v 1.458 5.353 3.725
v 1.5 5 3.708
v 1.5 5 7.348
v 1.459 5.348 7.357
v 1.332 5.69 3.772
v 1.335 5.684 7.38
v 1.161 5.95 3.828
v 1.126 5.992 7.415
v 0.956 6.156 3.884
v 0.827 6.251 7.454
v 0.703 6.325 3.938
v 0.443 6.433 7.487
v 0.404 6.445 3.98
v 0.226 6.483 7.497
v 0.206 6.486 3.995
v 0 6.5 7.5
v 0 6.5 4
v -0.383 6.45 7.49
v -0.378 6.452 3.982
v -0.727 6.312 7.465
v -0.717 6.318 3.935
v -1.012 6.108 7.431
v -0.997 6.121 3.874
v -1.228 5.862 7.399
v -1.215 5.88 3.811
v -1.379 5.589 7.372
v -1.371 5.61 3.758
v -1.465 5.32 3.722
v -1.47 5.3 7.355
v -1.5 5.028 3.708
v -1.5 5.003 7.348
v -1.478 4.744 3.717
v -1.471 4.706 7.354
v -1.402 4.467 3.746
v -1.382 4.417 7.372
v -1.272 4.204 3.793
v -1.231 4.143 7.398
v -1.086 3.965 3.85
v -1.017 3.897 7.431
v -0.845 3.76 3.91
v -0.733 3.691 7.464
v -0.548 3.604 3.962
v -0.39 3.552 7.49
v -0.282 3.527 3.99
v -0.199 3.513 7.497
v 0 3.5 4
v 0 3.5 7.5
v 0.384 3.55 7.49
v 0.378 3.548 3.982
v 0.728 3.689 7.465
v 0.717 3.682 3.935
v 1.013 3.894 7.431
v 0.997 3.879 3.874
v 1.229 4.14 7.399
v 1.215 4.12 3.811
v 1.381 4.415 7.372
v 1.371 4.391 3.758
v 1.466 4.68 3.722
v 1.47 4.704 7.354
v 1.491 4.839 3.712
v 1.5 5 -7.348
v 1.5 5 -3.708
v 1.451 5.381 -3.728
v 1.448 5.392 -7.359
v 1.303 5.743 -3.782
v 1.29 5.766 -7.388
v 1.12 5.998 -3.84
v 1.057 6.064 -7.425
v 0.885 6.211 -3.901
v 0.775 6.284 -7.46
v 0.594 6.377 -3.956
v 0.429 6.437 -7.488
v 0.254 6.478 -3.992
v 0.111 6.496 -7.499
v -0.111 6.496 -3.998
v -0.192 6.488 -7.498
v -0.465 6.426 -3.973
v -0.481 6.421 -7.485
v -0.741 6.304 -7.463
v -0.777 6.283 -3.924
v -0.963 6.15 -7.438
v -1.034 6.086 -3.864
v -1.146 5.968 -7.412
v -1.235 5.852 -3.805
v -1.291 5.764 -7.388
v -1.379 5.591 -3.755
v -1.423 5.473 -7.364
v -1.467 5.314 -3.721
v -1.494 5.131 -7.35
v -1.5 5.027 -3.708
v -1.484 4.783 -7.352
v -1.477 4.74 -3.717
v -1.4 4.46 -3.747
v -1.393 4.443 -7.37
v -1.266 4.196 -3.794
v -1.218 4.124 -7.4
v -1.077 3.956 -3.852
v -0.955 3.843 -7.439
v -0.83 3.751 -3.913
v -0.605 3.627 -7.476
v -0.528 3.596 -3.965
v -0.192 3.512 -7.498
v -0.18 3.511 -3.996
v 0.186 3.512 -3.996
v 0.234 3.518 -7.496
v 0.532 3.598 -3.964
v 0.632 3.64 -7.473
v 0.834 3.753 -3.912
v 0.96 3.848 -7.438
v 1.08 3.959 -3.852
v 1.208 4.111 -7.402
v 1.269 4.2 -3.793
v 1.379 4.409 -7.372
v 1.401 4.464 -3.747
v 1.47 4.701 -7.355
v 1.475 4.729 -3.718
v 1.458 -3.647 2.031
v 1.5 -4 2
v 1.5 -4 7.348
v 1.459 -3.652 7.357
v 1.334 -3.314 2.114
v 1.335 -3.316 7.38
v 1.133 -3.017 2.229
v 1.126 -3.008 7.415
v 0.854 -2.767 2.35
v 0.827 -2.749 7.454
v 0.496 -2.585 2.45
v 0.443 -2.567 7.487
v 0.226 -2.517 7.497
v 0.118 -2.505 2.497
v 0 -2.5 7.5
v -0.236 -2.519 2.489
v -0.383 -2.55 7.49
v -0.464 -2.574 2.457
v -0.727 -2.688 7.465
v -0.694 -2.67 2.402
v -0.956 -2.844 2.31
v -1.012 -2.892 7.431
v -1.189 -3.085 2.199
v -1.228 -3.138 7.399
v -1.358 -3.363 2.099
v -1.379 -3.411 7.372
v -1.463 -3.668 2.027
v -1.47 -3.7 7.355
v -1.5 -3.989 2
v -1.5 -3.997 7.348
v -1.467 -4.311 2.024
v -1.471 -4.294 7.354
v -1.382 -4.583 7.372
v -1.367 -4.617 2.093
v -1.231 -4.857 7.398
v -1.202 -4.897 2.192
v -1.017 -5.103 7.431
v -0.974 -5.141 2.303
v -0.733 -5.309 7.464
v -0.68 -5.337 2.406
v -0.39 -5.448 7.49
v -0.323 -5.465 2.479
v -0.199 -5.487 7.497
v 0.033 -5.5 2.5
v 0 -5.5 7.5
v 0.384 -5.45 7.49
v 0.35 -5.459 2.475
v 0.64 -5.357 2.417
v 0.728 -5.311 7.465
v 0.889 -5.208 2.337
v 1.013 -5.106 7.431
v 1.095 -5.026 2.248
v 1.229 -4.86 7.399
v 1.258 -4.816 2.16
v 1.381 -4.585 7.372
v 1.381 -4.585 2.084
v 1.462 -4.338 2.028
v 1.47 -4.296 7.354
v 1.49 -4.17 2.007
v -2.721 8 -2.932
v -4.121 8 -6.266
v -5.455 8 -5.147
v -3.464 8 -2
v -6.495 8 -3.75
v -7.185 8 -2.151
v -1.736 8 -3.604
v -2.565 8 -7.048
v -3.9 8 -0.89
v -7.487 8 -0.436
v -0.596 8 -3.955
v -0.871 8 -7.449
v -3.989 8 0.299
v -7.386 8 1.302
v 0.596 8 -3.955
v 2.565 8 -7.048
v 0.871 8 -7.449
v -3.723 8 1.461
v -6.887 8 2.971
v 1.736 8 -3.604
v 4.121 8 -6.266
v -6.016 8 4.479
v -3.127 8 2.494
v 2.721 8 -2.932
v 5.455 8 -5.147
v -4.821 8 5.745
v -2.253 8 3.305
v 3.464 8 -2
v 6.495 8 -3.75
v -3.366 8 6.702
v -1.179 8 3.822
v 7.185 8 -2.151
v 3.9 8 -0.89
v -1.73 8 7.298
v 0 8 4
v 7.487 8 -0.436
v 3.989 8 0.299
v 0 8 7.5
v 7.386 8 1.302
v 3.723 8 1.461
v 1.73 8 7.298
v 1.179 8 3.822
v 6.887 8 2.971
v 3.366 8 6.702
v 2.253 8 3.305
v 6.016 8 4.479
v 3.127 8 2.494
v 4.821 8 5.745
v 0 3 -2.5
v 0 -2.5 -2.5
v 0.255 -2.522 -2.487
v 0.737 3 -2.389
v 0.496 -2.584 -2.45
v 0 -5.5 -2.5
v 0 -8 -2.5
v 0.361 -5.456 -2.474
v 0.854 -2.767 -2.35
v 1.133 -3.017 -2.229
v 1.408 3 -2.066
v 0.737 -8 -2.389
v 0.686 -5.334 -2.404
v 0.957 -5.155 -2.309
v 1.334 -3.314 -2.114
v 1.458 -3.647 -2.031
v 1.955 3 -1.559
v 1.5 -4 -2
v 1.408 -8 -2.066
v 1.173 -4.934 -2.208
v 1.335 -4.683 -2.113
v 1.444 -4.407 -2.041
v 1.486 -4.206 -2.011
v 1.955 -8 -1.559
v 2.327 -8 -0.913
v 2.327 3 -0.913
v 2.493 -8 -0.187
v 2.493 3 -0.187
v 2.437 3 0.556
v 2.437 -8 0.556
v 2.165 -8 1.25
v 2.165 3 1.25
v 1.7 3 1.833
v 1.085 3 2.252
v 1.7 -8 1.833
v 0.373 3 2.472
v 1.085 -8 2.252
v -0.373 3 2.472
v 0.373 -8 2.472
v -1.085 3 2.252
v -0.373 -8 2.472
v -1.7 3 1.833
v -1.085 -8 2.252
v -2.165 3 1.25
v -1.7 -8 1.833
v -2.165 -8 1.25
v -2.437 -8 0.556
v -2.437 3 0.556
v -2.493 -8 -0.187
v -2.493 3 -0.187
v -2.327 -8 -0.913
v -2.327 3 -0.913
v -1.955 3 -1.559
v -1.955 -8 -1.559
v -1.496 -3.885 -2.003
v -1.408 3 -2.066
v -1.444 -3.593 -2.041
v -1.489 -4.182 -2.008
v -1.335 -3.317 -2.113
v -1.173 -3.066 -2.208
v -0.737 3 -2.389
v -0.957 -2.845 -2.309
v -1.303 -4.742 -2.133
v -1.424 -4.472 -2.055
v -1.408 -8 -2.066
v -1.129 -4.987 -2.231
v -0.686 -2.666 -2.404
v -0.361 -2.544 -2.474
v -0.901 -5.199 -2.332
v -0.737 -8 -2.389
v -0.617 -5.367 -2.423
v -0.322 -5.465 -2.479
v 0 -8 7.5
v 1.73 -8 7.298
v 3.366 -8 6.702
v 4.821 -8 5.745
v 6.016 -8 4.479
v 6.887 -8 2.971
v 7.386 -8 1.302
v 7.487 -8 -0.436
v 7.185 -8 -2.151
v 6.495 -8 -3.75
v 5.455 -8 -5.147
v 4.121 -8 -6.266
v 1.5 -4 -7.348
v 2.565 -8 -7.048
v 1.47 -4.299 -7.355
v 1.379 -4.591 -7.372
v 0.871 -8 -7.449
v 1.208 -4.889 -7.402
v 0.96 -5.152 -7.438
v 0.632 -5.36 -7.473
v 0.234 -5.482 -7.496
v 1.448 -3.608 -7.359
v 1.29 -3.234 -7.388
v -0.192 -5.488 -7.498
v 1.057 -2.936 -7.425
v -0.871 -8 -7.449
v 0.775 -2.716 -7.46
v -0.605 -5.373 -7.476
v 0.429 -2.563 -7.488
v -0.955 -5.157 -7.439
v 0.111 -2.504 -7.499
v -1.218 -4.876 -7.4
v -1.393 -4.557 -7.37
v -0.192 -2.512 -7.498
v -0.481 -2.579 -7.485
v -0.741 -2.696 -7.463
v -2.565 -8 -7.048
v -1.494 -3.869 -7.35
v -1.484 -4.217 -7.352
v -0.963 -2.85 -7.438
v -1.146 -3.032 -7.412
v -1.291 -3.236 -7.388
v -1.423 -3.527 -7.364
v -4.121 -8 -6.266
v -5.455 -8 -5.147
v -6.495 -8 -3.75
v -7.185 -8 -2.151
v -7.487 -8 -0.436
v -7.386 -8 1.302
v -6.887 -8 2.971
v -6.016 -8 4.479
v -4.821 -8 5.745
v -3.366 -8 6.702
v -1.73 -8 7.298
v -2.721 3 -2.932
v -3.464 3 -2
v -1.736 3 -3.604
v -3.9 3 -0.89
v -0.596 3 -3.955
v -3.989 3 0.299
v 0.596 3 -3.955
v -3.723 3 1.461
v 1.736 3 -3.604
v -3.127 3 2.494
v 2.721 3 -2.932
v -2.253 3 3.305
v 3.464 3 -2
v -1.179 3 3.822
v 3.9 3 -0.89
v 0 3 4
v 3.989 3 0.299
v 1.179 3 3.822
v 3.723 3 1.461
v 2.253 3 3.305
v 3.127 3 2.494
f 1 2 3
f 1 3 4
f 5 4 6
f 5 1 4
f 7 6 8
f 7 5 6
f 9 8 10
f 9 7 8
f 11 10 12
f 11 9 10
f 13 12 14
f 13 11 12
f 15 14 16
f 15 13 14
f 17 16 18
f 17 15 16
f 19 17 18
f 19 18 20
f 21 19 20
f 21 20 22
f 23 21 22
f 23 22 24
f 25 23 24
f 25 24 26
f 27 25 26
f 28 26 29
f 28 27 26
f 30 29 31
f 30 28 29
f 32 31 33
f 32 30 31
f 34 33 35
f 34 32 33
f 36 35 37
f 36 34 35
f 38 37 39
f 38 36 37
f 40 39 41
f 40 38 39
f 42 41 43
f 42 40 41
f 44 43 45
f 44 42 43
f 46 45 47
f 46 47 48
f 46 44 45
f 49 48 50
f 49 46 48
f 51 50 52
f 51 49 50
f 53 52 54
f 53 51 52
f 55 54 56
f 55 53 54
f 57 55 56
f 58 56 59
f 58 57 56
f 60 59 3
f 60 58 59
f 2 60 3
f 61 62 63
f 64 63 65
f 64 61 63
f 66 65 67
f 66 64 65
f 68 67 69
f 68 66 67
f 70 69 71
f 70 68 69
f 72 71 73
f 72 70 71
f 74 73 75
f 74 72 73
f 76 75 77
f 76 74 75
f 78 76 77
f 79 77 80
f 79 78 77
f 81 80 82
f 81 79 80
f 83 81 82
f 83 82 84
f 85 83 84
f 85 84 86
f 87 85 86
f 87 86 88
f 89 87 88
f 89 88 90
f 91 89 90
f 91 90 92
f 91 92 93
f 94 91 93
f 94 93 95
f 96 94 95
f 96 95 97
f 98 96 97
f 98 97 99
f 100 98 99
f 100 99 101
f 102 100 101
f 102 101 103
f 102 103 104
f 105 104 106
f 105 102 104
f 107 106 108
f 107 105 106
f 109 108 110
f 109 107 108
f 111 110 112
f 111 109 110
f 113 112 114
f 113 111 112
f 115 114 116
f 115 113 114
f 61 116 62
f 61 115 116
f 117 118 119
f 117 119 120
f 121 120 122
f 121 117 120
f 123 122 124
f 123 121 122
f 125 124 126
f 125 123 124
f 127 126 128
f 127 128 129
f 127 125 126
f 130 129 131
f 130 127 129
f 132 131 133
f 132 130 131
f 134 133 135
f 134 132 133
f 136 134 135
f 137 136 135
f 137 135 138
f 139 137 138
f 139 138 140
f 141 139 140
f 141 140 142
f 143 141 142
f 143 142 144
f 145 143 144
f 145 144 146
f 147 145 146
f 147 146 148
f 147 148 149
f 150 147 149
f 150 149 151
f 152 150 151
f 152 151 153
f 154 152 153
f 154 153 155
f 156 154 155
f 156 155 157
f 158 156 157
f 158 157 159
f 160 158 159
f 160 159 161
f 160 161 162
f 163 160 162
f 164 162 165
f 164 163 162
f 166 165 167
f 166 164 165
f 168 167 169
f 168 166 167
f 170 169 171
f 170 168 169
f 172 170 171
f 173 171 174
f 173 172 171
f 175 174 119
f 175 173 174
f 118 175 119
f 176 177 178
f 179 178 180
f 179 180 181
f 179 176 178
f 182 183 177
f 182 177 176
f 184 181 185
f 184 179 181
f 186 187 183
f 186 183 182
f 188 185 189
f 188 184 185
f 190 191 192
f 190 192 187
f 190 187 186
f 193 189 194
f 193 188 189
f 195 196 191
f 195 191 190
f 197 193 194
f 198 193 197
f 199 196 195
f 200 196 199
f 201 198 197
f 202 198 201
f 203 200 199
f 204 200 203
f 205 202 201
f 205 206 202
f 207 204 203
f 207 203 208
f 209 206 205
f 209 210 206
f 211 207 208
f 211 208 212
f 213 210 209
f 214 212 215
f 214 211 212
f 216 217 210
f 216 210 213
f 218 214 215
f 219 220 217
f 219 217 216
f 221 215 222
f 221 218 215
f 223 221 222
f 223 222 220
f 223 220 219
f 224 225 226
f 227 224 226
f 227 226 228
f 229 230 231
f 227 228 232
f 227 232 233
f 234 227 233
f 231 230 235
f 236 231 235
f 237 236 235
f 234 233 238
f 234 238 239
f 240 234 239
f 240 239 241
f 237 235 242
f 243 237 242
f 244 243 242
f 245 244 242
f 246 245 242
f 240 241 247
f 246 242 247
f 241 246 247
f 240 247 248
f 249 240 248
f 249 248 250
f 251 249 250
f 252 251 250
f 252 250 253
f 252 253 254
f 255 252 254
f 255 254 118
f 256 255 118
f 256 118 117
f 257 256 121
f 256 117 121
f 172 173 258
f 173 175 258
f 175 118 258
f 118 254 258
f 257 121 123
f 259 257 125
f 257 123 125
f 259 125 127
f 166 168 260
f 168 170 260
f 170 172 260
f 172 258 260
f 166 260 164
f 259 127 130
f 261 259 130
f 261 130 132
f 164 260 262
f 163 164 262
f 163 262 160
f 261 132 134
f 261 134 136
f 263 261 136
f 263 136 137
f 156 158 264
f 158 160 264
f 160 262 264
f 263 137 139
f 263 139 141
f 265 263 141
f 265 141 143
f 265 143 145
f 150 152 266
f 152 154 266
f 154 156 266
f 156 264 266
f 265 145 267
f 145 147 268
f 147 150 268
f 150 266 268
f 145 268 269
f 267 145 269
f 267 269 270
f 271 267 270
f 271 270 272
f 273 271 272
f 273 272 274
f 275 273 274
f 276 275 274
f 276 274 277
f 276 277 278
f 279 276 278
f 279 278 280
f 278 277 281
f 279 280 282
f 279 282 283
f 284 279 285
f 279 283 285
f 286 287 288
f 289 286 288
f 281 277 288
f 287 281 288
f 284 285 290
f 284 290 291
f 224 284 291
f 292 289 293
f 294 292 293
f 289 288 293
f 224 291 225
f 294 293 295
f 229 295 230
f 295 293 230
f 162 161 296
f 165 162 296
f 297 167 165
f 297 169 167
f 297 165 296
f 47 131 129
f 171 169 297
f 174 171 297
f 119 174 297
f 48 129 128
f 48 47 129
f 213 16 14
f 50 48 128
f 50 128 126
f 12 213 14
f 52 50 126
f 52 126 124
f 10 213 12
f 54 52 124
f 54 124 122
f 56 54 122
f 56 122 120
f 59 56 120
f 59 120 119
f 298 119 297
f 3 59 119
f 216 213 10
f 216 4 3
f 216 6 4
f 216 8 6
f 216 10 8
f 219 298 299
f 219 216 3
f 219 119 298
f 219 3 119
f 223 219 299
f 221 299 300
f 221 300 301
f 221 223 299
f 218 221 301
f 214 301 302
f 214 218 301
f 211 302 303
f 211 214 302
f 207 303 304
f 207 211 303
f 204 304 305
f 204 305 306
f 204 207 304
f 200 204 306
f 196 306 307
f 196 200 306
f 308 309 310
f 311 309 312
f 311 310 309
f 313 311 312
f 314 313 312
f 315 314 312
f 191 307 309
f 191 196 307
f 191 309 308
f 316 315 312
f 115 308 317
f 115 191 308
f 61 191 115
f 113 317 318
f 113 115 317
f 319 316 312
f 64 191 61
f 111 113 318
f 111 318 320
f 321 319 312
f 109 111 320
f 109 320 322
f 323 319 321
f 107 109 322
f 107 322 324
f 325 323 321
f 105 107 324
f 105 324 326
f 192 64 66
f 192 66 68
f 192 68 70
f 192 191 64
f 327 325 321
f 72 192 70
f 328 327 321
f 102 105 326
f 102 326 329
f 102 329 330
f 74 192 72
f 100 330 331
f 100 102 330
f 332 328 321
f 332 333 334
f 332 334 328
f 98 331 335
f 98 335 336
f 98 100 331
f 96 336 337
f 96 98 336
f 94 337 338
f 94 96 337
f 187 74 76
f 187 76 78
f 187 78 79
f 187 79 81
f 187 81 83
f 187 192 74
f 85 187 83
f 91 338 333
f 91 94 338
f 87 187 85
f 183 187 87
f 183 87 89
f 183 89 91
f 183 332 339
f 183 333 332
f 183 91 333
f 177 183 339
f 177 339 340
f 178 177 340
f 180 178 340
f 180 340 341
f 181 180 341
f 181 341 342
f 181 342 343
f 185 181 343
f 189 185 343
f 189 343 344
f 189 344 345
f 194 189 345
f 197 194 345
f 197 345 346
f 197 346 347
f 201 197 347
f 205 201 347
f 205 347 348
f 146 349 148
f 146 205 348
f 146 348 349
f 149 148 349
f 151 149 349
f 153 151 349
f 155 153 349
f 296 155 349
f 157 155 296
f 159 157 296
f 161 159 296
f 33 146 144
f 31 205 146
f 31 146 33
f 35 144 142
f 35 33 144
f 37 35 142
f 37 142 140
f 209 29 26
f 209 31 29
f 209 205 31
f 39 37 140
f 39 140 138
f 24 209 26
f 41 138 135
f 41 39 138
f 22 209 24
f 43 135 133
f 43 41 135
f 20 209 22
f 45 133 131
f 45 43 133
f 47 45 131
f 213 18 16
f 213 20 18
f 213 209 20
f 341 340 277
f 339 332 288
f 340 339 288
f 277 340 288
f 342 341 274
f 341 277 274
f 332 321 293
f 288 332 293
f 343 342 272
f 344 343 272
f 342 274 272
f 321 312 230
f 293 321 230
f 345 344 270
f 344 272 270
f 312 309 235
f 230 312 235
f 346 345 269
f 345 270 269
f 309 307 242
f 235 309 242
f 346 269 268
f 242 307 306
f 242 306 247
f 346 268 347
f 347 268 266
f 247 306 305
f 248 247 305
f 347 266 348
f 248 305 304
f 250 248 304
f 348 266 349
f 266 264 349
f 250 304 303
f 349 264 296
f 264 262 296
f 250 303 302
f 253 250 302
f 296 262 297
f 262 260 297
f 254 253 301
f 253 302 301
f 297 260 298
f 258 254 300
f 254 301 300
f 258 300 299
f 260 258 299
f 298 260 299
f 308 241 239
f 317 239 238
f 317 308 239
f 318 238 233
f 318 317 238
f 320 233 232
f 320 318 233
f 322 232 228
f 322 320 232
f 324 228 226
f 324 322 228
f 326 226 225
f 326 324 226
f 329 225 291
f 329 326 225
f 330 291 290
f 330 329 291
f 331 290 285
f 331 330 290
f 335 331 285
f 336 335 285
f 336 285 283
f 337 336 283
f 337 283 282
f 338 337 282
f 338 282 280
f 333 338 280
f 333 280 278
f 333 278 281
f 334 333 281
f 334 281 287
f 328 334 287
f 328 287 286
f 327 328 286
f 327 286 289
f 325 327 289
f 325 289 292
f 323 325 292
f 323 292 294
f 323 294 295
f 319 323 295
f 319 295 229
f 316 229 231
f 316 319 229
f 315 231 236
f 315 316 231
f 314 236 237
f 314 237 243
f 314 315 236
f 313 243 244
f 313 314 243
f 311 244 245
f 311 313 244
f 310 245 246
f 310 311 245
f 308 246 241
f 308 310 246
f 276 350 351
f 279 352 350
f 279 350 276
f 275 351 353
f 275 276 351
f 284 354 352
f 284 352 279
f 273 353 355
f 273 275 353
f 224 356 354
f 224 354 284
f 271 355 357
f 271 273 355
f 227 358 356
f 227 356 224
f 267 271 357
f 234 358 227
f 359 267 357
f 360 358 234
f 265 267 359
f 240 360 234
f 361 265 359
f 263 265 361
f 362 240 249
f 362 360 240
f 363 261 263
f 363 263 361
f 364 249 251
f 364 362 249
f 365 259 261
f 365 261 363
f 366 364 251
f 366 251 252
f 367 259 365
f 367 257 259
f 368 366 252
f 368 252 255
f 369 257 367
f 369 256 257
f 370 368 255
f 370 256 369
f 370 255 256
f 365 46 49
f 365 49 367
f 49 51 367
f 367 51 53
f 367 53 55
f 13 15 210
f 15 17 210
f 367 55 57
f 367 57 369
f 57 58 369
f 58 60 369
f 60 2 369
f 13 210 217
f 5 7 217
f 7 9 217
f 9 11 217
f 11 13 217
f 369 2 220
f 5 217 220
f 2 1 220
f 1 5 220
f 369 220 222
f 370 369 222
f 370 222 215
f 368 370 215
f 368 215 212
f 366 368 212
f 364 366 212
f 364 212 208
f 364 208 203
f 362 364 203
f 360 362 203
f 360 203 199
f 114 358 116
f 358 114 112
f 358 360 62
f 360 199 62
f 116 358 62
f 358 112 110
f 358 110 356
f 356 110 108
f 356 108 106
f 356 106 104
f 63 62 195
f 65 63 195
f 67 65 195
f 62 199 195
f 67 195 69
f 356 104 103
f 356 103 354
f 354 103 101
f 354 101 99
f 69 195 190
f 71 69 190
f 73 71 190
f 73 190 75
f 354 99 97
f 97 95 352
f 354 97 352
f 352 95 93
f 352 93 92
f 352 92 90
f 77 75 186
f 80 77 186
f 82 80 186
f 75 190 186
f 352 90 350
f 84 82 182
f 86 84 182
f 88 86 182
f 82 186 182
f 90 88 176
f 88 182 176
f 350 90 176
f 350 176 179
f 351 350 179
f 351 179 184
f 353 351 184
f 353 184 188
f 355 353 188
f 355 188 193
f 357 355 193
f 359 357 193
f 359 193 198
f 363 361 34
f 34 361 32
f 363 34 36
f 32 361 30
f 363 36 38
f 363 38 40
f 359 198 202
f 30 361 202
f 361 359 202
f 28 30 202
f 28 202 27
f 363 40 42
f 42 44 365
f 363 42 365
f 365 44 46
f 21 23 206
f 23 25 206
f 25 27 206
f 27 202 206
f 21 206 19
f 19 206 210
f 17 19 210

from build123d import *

# Parameters (mm, degrees)
SKETCH1_R               = 7.5
BOSS_EXTRUDE1_DEPTH     = 8
SKETCH2_R               = 4
CUT_EXTRUDE1_DEPTH      = 5
SKETCH3_R               = 2.5
CUT_EXTRUDE2_DEPTH      = 12
CUT_EXTRUDE3_DEPTH      = 14.285330256
CUT_EXTRUDE3_DEPTH_BACK = 14.285330256
SKETCH4_R               = 1.5


with BuildPart() as part:
    # Sketch1 → Boss-Extrude1 (new, symmetric)
    with BuildSketch(Plane(origin=(0, 0, 0), x_dir=(1, 0, 0), z_dir=(0, 1, 0))):
        with Locations(Location((0, 0, 0), (0, 0, 270))):
            Circle(SKETCH1_R)
    extrude(amount=BOSS_EXTRUDE1_DEPTH, both=True)

    # Sketch2 → Cut-Extrude1 (cut)
    with BuildSketch(Plane(origin=(0, 8, 0), x_dir=(1, 0, 0), z_dir=(0, 1, 0))):
        with Locations(Location((0, 0, 0), (0, 0, 270))):
            Circle(SKETCH2_R)
    extrude(amount=-CUT_EXTRUDE1_DEPTH, mode=Mode.SUBTRACT)

    # Sketch3 → Cut-Extrude2 (cut)
    with BuildSketch(Plane.XZ.offset(8)):
        with Locations(Location((0, 0, 0), (0, 0, 270))):
            Circle(SKETCH3_R)
    extrude(amount=-CUT_EXTRUDE2_DEPTH, mode=Mode.SUBTRACT)

    # Sketch4 → Cut-Extrude3 (cut, two sides: drawn at the far end of the back side and taken through both)
    with BuildSketch(Plane.XY.offset(-CUT_EXTRUDE3_DEPTH_BACK)):
        with Locations((0, -4)):
            Circle(SKETCH4_R)
        with Locations((0, 5)):
            Circle(SKETCH4_R)
    extrude(amount=CUT_EXTRUDE3_DEPTH + CUT_EXTRUDE3_DEPTH_BACK, mode=Mode.SUBTRACT)


solid = part.part
